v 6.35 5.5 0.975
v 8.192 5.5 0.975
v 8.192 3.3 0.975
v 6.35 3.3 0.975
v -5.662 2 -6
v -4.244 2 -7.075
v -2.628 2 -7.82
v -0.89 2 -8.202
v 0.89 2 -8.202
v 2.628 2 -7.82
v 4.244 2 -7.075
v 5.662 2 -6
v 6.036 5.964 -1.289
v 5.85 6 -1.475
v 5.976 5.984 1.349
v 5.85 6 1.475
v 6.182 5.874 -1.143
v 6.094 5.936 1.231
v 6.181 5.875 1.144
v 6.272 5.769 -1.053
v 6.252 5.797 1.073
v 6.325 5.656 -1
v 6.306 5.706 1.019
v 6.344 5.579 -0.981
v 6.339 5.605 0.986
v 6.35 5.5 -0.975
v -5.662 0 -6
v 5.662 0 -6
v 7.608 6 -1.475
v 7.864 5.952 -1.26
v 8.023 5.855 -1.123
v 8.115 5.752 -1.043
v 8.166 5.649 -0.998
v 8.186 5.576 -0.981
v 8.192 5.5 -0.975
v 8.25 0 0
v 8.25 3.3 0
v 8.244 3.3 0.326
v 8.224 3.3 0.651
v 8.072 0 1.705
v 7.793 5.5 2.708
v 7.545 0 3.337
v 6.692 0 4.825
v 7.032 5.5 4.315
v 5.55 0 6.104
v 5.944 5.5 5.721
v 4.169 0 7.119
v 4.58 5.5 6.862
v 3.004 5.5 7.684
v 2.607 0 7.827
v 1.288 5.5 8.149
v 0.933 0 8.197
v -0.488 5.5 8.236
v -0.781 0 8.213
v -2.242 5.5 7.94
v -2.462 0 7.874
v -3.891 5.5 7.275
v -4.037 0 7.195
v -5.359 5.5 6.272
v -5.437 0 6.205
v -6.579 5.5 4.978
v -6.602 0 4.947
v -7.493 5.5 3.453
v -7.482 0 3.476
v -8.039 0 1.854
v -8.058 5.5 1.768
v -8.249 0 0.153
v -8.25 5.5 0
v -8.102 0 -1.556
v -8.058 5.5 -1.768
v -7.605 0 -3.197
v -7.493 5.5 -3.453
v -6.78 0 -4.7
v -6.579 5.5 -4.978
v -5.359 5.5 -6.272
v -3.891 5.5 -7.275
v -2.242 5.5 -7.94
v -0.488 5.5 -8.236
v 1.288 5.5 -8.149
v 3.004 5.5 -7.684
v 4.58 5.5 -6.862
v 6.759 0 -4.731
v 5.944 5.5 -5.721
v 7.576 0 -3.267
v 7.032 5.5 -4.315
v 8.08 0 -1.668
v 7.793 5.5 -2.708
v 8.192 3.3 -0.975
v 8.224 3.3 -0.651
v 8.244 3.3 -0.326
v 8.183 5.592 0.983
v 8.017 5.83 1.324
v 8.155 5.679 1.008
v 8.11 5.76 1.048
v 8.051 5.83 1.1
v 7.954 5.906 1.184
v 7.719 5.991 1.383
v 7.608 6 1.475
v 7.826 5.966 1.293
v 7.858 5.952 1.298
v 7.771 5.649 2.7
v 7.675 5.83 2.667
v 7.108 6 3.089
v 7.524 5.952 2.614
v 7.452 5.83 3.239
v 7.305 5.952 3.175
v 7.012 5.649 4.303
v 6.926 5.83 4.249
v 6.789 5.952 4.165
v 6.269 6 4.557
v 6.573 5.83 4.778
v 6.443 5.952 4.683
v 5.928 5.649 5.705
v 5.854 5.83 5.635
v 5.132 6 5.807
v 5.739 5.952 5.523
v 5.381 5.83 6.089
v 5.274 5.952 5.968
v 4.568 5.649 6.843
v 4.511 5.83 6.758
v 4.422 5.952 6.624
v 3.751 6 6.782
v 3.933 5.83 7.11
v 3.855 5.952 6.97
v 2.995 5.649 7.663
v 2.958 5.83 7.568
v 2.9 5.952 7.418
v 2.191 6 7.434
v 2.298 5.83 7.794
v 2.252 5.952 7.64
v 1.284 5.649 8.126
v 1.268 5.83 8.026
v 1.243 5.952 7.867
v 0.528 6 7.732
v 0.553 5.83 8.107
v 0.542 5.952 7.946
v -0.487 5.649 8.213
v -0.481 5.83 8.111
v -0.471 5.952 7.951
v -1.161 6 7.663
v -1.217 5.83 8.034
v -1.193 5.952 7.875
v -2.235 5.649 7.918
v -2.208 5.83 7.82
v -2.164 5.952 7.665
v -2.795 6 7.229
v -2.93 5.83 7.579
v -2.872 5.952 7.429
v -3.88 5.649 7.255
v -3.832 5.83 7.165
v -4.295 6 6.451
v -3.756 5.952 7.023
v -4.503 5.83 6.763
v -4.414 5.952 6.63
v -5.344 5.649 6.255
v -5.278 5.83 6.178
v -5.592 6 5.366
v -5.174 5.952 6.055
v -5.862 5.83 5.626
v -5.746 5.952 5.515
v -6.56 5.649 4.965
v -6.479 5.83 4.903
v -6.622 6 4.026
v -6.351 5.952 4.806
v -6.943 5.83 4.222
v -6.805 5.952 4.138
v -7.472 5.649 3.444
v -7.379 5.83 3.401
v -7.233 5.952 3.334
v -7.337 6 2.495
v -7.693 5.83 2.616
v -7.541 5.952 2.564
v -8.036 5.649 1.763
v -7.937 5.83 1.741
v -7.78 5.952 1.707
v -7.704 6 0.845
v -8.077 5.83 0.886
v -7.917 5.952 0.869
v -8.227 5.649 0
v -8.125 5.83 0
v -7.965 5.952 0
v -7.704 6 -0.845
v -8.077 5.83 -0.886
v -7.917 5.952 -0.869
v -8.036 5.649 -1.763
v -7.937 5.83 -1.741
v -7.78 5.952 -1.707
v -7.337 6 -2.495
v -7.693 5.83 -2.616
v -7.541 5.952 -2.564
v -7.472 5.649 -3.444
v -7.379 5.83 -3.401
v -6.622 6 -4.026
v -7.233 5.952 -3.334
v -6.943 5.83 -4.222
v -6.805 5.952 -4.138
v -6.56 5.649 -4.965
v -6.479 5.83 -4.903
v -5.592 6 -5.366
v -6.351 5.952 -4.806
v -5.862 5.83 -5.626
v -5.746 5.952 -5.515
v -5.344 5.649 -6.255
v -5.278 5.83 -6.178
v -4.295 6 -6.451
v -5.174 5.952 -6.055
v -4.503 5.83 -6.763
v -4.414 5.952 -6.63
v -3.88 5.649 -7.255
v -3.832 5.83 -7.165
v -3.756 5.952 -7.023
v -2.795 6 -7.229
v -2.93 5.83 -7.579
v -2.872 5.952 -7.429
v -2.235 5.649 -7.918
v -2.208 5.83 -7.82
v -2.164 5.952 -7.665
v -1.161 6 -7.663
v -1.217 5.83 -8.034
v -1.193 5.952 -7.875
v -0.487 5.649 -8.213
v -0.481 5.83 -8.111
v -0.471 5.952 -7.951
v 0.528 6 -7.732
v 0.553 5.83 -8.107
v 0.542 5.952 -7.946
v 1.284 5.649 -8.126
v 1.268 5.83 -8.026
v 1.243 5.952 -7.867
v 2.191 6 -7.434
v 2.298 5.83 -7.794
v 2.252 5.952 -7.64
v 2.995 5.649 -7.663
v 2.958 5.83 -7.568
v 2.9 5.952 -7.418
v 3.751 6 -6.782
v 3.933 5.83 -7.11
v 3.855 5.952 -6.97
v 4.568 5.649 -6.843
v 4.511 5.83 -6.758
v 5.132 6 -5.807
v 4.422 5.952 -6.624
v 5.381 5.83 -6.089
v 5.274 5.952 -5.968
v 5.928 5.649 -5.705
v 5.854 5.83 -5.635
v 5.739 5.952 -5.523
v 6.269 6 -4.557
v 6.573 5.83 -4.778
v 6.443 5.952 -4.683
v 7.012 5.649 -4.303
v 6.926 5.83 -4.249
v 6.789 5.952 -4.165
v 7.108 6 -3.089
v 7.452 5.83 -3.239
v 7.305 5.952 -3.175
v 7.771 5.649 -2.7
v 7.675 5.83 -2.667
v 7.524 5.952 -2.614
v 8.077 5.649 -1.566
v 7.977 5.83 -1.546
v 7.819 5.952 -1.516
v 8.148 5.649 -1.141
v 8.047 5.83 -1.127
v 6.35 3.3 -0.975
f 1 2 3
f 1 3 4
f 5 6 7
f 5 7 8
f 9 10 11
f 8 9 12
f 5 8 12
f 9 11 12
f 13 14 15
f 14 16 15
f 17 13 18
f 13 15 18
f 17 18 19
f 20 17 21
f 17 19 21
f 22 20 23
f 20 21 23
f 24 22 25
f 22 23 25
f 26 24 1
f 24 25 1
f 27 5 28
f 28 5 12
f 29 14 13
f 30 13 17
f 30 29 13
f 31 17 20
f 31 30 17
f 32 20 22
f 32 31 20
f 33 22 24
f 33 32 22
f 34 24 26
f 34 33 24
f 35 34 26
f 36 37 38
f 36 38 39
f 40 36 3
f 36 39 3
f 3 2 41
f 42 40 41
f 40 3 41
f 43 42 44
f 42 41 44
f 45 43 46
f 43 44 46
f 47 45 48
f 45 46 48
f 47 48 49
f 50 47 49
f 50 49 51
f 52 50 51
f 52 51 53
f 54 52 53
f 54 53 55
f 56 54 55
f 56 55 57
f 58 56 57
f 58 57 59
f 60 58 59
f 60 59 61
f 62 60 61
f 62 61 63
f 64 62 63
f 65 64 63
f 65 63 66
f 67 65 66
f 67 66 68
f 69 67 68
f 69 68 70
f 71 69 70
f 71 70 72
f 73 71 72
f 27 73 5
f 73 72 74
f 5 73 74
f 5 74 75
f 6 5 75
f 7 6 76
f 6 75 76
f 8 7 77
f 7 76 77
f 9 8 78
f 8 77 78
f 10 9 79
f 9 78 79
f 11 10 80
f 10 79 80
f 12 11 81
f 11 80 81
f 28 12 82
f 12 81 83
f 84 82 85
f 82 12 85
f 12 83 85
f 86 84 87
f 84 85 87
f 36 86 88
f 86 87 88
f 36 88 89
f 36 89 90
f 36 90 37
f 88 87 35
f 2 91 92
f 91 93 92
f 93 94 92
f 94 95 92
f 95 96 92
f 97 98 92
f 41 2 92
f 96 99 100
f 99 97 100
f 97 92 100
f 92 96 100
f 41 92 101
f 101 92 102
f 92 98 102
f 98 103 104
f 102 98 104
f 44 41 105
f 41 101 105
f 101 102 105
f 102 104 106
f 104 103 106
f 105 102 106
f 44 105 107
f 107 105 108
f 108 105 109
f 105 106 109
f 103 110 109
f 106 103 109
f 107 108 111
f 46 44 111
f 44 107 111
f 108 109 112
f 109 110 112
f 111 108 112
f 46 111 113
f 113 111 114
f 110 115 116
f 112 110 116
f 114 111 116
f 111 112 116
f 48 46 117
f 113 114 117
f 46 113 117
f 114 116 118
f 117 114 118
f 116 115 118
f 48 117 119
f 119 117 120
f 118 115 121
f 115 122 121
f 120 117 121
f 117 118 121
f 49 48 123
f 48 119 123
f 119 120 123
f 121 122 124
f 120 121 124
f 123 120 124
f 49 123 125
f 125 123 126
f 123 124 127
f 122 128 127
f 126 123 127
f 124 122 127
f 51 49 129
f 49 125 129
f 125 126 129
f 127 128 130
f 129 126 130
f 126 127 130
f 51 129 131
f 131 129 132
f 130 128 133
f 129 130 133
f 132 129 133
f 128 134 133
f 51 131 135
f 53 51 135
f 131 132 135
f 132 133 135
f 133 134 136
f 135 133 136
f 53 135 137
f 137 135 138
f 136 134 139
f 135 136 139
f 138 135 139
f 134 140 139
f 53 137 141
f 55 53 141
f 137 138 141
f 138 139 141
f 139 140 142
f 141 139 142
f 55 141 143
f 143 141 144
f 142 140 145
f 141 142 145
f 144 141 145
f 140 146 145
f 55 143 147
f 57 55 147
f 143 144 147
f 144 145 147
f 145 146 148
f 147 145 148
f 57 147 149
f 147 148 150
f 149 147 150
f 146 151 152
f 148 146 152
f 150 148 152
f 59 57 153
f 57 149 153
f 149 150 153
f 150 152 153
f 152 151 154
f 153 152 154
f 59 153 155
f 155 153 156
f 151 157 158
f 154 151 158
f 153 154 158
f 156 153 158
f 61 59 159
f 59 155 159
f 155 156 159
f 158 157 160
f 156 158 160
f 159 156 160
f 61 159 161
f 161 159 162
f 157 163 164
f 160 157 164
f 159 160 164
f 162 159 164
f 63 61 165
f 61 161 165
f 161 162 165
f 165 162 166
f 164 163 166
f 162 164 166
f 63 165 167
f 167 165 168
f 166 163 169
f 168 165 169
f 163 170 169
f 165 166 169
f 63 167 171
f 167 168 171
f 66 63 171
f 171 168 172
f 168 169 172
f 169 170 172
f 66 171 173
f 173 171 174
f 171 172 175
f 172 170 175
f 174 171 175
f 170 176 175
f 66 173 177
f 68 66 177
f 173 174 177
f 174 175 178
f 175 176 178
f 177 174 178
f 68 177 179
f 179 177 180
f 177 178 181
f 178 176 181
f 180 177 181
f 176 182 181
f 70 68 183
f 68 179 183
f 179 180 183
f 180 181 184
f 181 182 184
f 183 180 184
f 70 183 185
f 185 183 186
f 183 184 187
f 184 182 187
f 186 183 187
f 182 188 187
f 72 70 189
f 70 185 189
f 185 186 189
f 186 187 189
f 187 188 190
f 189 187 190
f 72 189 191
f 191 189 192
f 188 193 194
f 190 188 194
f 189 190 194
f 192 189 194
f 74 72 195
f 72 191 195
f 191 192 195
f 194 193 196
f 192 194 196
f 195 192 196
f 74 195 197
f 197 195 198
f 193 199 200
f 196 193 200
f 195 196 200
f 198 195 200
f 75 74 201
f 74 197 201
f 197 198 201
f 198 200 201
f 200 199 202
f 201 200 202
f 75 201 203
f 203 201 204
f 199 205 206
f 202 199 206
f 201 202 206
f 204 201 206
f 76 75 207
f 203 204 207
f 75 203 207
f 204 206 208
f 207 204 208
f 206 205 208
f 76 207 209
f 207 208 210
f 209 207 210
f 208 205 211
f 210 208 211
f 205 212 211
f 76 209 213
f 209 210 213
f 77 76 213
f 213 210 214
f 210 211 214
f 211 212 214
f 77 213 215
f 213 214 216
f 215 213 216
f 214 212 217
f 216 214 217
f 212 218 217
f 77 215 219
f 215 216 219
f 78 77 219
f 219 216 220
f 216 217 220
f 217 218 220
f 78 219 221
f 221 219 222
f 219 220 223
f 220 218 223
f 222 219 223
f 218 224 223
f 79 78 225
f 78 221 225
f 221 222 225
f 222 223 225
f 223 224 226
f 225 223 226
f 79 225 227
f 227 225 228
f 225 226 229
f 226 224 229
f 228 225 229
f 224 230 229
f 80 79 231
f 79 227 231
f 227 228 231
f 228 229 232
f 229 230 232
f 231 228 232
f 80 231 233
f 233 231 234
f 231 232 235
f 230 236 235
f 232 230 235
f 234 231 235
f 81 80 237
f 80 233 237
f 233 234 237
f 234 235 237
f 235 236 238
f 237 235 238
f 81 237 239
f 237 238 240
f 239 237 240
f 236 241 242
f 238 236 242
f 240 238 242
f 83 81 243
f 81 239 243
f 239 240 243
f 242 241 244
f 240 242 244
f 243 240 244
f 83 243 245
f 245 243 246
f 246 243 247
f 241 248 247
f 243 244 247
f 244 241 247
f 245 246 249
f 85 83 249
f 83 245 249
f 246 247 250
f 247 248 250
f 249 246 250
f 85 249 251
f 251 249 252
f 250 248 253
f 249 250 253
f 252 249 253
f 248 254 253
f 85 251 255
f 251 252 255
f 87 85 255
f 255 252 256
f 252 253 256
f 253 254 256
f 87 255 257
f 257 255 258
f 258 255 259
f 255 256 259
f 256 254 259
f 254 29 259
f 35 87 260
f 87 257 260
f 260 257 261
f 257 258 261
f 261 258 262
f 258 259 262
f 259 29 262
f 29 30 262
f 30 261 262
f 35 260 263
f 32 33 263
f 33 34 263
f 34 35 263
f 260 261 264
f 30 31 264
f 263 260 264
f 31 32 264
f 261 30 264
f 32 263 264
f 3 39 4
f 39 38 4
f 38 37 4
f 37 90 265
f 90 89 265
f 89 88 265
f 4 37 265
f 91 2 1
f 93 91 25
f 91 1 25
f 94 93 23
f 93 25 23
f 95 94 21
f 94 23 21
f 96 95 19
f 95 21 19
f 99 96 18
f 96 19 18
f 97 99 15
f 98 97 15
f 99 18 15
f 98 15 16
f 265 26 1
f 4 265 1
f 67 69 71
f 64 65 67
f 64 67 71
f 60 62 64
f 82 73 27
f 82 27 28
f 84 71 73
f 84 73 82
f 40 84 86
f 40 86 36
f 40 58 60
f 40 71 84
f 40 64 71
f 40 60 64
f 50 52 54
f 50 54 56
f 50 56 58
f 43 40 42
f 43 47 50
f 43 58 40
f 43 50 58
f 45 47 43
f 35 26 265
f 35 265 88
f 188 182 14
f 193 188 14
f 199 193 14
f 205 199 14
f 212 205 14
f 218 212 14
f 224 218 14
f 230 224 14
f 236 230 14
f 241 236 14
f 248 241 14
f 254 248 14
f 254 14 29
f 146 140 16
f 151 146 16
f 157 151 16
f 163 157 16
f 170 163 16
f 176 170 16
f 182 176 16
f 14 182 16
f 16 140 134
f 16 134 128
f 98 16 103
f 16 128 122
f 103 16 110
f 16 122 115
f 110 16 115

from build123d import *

# Parameters (mm, degrees)
SKETCH100_W     = 14
SKETCH100_H     = 2
PAD063_DEPTH    = 3
SKETCH110_R     = 8.25
PAD067_DEPTH    = 6
POCKET022_DEPTH = 2.7
FILLET009_R     = 0.5


with BuildPart() as hole006:
    # Sketch100 → Pad063 (new body)
    with BuildSketch(Plane.XY):
        with Locations((0, 1)):
            Rectangle(SKETCH100_W, SKETCH100_H)
    extrude(amount=PAD063_DEPTH)


with BuildPart() as hole006_1:
    # Body025 placement: moved
    add(hole006.part.moved(Location((0, 0, -9))))


with BuildPart() as metal_case001:
    # Sketch110 → Pad067 (new body)
    with BuildSketch(Plane.XZ):
        Circle(SKETCH110_R)
    extrude(amount=PAD067_DEPTH)

    # Sketch102 (on Face2 of Pad067) → Pocket022 (cut)
    with BuildSketch(Plane(origin=(0, 0, 0), x_dir=(1, 0, 0), z_dir=(0, 1, 0))):
        Polygon((6.35, 0.975), (8.25, 0.975), (8.25, -0.975), (6.35, -0.975), (6.35, 0), align=None)
    extrude(amount=-POCKET022_DEPTH, mode=Mode.SUBTRACT)

    # Fillet009
    fillet009_edges = [metal_case001.edges().sort_by_distance(p)[0] for p in [
        (7.271092, 0, 0.975),
        (6.35, 0, 0.4875),
        (6.35, 0, -0.4875),
        (7.271092, 0, -0.975),
        (-8.25, 0, 0),
    ]]
    fillet(fillet009_edges, radius=FILLET009_R)


with BuildPart() as metal_case001_1:
    # Body027 placement: moved
    add(metal_case001.part.moved(Location((0, 6, 0))))

    # Cut001: cut Hole006
    add(hole006_1.part, mode=Mode.SUBTRACT)


solid = metal_case001_1.part
